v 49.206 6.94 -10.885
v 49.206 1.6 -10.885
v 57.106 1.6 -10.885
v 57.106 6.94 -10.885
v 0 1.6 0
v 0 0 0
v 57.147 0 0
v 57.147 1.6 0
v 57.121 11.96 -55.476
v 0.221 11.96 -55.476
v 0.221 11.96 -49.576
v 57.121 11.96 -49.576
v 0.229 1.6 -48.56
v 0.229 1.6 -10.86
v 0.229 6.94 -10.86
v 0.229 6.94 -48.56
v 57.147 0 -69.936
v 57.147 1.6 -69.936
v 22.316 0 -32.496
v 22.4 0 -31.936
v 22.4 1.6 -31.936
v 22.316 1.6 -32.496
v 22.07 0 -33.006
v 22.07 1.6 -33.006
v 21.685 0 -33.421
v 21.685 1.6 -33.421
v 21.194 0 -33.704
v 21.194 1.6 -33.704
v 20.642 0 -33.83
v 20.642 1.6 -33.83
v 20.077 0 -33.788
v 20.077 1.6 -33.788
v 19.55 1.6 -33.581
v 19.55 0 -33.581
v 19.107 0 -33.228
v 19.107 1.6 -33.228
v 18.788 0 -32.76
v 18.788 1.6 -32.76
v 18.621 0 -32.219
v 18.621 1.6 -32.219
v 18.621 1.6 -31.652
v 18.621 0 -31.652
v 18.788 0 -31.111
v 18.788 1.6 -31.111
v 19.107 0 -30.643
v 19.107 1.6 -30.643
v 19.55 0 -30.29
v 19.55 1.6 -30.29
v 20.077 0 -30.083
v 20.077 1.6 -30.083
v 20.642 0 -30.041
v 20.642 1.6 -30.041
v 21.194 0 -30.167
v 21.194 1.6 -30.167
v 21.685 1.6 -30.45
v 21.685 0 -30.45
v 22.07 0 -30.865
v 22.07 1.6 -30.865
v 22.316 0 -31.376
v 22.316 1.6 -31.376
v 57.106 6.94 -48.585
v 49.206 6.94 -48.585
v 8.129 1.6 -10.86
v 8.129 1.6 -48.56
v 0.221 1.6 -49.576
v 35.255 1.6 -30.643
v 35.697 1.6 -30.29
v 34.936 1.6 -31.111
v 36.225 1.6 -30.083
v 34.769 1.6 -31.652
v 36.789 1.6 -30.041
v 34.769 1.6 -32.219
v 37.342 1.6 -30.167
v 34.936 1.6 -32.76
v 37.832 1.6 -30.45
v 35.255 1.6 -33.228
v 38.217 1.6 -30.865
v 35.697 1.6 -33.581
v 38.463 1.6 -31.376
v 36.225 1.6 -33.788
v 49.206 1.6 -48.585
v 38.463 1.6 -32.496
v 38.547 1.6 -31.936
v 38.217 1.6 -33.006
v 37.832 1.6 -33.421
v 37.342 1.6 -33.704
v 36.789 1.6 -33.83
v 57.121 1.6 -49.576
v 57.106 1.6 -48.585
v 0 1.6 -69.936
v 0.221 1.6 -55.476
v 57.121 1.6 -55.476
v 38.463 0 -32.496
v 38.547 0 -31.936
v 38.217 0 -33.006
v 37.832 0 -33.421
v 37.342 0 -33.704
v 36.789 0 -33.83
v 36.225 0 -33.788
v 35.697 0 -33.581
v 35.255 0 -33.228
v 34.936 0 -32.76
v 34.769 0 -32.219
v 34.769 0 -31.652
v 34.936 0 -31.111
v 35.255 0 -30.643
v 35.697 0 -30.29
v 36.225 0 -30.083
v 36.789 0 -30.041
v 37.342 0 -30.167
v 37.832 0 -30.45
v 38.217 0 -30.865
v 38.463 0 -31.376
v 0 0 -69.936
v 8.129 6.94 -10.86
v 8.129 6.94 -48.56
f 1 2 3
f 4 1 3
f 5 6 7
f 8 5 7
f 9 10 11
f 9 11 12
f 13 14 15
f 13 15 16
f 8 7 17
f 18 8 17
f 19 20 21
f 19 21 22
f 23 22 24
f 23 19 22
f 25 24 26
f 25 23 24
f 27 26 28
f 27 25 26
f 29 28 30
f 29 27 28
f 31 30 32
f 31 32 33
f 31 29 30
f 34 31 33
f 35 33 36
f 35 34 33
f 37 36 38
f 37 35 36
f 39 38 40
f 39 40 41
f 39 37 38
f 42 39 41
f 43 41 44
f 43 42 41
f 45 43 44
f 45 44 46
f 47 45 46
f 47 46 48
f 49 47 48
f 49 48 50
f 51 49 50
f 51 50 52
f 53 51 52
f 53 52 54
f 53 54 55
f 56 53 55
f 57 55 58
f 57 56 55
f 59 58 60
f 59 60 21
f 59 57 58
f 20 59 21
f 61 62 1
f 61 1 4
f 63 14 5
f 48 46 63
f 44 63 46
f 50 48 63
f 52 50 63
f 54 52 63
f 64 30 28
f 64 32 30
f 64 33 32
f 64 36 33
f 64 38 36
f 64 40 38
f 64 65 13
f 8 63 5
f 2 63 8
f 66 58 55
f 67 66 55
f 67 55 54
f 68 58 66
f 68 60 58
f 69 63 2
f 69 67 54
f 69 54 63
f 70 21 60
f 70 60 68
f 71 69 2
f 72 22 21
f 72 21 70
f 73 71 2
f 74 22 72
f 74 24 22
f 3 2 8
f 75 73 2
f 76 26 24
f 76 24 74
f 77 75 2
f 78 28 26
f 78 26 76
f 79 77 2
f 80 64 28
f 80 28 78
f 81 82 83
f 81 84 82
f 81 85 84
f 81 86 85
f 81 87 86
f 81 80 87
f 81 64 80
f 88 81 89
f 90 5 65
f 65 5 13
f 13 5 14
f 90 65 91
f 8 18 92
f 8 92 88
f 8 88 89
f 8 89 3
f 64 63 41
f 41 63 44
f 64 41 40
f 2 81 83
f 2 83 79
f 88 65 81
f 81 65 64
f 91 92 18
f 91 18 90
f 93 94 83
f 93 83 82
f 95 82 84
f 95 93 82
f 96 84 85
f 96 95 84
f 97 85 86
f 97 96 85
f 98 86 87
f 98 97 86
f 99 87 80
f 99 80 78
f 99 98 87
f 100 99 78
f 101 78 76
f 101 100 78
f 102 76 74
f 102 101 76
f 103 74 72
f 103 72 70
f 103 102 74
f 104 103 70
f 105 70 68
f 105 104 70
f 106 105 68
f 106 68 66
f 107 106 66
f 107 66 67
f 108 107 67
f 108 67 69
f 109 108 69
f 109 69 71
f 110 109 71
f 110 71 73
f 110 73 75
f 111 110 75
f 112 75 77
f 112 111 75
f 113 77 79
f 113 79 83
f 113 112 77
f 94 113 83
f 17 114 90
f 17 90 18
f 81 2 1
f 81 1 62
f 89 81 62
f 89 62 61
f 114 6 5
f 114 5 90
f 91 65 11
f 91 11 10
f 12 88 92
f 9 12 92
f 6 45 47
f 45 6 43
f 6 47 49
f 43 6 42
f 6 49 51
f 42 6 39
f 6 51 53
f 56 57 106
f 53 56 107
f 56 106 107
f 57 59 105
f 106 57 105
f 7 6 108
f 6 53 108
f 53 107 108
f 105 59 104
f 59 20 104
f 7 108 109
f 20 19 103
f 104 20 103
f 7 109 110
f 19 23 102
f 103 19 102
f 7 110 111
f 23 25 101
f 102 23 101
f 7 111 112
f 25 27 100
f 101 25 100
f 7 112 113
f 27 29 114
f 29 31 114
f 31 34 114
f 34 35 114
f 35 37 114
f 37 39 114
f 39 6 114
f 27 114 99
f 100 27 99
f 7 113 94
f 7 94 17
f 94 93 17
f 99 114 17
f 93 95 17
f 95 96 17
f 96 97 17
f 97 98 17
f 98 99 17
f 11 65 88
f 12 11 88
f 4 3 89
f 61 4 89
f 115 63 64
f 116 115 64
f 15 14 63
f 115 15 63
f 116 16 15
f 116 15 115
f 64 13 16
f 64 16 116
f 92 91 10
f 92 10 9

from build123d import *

# Parameters (mm, degrees)
ESQUISSE1_W        = 57.14738142
ESQUISSE1_H        = 69.935606632
ESQUISSE1_R        = 1.9
BOSS_EXTRU_7_DEPTH = 1.6
ESQUISSE6_W        = 7.9
ESQUISSE6_H        = 37.7
BOSS_EXTRU_8_DEPTH = 5.34
ESQUISSE7_W        = 56.9
ESQUISSE7_H        = 5.9
BOSS_EXTRU_9_DEPTH = 10.36


with BuildPart() as part:
    # Esquisse1 → Boss.-Extru.7 (new body)
    with BuildSketch(Plane(origin=(0, 0, 0), x_dir=(1, 0, 0), z_dir=(0, 1, 0))):
        with Locations((28.57369071, 34.967803316)):
            Rectangle(ESQUISSE1_W, ESQUISSE1_H)
        with Locations((20.5, 31.935606632)):
            Circle(ESQUISSE1_R, mode=Mode.SUBTRACT)
        with Locations((36.64738142, 31.935606632)):
            Circle(ESQUISSE1_R, mode=Mode.SUBTRACT)
    extrude(amount=BOSS_EXTRU_7_DEPTH)

    # Esquisse6 → Boss.-Extru.8 (add)
    with BuildSketch(Plane(origin=(0, 1.6, 0), x_dir=(1, 0, 0), z_dir=(0, 1, 0))):
        with Locations((53.155892473, 29.734566664)):
            Rectangle(ESQUISSE6_W, ESQUISSE6_H)
        with Locations((4.178526772, 29.710022265)):
            Rectangle(ESQUISSE6_W, ESQUISSE6_H)
    extrude(amount=BOSS_EXTRU_8_DEPTH)

    # Esquisse7 → Boss.-Extru.9 (add)
    with BuildSketch(Plane(origin=(0, 1.6, 0), x_dir=(1, 0, 0), z_dir=(0, 1, 0))):
        with Locations((28.670599558, 52.525606632)):
            Rectangle(ESQUISSE7_W, ESQUISSE7_H)
    extrude(amount=BOSS_EXTRU_9_DEPTH)


solid = part.part
